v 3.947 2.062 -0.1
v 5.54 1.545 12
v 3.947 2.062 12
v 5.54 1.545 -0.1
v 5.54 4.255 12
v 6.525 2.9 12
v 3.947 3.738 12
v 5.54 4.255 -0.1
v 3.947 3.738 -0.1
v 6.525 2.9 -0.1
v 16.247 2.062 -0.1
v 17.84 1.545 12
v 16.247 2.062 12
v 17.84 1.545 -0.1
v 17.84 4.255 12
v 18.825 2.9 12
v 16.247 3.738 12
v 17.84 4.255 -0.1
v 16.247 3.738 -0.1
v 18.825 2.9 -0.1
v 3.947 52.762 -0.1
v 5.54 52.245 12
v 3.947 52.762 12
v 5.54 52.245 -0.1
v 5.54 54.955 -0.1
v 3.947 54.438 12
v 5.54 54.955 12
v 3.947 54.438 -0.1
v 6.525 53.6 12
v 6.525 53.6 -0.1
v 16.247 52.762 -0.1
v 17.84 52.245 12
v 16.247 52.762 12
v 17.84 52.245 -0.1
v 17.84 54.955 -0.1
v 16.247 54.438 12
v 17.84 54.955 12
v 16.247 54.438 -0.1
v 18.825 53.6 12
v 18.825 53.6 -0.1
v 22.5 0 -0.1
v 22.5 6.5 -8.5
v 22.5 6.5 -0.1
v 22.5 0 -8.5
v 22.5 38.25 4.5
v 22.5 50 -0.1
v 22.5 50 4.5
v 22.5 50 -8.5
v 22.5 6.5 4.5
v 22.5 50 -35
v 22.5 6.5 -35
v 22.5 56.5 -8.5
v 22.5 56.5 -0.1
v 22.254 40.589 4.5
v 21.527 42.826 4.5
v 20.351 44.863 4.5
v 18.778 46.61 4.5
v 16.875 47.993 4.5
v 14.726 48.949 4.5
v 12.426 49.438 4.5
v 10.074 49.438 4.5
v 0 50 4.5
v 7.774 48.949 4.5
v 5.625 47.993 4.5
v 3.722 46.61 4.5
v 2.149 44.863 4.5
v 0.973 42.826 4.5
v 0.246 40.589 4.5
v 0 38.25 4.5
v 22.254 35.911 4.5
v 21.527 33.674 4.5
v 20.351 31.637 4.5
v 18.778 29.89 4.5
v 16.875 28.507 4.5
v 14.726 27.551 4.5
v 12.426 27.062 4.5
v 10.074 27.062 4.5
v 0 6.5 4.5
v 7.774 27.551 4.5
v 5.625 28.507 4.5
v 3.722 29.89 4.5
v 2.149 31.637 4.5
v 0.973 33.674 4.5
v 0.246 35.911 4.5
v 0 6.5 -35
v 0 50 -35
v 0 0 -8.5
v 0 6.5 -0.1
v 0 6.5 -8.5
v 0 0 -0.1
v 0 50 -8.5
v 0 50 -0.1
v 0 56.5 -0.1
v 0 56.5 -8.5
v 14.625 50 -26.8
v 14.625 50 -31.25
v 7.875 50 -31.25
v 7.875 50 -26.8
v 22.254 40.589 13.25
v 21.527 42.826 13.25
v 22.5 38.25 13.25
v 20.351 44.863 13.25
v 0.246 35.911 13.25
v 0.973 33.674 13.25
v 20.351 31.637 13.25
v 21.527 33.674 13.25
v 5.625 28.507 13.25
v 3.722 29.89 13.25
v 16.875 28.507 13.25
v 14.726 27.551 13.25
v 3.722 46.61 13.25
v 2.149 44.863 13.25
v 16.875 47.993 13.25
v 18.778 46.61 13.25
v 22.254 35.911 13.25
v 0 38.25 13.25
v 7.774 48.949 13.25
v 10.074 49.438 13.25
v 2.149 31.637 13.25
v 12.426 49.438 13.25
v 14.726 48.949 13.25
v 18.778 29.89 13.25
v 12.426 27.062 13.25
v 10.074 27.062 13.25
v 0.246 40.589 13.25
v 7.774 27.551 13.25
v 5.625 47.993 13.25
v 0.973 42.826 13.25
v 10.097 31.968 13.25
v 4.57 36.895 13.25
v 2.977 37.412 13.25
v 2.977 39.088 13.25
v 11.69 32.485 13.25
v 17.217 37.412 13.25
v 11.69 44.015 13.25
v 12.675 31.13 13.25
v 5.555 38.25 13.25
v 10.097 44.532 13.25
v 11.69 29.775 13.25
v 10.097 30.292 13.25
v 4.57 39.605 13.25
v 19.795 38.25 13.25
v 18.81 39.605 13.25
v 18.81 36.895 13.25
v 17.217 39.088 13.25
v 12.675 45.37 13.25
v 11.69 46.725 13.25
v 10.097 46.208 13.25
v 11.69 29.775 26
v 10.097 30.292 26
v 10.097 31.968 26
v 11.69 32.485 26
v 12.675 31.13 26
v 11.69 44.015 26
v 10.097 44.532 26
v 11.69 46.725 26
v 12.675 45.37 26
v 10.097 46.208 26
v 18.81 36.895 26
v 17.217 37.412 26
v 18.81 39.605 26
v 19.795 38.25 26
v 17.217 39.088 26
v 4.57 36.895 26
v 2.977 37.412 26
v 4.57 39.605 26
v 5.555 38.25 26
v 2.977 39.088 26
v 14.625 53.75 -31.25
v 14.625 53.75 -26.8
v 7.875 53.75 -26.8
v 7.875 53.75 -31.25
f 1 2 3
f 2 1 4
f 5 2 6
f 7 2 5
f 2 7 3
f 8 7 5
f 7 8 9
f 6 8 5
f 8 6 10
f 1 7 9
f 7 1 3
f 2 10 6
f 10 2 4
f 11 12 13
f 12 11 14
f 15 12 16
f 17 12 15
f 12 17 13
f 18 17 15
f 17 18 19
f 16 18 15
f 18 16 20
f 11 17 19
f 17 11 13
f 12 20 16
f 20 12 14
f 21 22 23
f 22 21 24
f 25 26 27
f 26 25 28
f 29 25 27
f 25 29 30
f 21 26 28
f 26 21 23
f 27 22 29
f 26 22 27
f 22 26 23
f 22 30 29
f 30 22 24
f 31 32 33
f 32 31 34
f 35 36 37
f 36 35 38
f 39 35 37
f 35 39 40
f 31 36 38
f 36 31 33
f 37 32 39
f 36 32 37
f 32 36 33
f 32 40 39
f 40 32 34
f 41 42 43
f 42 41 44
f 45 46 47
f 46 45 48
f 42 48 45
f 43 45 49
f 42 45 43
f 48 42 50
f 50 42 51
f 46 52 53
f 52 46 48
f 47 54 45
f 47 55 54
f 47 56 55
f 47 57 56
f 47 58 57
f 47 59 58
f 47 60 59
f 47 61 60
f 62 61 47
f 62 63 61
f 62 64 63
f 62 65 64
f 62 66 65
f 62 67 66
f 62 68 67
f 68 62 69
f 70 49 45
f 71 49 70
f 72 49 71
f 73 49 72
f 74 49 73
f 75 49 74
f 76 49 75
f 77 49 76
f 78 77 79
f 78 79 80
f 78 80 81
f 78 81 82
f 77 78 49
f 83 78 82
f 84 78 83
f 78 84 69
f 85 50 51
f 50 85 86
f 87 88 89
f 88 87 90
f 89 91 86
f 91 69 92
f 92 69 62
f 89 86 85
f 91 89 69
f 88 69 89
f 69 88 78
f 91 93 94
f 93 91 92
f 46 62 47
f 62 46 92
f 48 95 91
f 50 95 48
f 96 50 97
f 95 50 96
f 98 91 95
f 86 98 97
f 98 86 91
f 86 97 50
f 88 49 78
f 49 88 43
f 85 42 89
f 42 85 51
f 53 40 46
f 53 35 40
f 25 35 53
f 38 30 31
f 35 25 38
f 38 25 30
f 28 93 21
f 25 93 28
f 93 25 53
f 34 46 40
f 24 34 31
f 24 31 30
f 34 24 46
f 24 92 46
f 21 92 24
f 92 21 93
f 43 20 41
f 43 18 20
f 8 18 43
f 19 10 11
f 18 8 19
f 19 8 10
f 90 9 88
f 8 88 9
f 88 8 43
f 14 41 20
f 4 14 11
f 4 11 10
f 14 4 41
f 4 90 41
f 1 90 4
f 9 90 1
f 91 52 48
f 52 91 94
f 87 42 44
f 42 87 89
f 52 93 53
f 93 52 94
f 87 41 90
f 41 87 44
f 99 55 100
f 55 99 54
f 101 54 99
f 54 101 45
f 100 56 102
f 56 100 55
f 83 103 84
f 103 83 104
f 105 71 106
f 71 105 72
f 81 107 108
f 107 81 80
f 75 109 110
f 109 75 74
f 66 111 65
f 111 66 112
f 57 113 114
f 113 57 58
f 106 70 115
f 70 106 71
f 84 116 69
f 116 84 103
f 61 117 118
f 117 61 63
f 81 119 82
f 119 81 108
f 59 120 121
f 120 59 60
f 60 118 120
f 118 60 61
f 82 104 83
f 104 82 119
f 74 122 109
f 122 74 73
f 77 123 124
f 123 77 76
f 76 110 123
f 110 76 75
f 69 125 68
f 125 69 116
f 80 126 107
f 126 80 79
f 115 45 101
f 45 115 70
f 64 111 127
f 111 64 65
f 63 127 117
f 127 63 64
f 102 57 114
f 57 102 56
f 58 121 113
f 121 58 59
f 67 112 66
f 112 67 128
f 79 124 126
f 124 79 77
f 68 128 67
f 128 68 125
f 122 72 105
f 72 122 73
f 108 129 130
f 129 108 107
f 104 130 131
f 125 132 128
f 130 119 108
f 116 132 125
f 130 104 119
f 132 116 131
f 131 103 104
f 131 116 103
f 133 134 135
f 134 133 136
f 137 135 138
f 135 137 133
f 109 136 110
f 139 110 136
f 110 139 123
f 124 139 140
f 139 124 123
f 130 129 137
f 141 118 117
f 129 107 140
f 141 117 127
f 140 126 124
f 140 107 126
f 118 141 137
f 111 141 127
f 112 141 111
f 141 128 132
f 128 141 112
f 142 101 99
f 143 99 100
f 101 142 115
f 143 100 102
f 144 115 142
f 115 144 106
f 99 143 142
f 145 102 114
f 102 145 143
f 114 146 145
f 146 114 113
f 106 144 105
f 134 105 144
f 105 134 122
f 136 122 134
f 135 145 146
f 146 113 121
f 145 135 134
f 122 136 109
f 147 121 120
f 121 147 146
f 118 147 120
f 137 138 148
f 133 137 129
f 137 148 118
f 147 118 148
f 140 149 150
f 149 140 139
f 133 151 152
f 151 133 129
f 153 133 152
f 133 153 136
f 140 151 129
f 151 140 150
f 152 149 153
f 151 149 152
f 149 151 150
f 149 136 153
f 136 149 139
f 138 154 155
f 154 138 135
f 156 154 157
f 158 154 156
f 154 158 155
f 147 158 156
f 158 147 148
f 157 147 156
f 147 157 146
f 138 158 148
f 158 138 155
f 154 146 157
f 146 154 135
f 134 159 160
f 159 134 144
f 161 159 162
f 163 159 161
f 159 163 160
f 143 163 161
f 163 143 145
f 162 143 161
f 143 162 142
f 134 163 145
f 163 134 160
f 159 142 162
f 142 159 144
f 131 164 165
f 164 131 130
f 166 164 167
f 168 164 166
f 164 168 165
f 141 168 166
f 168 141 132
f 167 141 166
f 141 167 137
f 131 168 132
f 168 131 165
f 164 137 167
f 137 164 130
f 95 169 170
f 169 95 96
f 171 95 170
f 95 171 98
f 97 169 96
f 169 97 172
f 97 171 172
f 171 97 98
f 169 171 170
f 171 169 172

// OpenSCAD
//When calling this module, use toleranceMotor(boolean,boolean); The first boolean determines the bolt direction(true is up, false is down) and the second determines where the module is centered (true centers at the hub, false centers at the motor mount)

//THIS IS FOR IF YOU USE OTHER KINDS OF MOTORS, MOTOROUTCROP IS THE DISTANCE FROM THE MOUNTING PLATE TO THE BUISNESS END OF YOUR MOTOR, IF YOU EVER NEED TO SWITCH TO ANOTHER JUST CHANGE THIS VALUE TO THE ACTUAL VALUE

function MotorOutcrop()= MotorCylinderHeight()+(MotorHeight()-(MotorWingsHeight()+MotorWingsDist()))-MotorTolerance();


//for use when the motor is incorporated into parts
	//this is distance, the short way, from the edge of the motor to the center of the hub
function MotorCenterDist()=(MotorCylinderDiam()/2) + ((MotorLength()-MotorBaseLength())/2-MotorTolerance()*2); 

//basic motor shape
function MotorHeight()=38;
function MotorBaseLength()=42;
function MotorThickness()=21;

//wings for mounting
function MotorWingsHeight()=5.5;
function MotorLength()=55;
function MotorWingsDist()=26.5;
function MotorBoltHeadHeight()=1.4;

//cylinder on top of motor
function MotorCylinderHeight()=(46-38);
function MotorCylinderDiam()=21;
function MotorCylinderDist()=31;

//all bolts
function MotorBoltHeight()=13.5;
function MotorBoltDiam()=2.1;

//body bolts
function MotorBoltDist()=4.35;

//cylinder bolts
function MotorCylBoltDist()=7.12;

//hub for wires
function MotorHubHeight()=3.7;
function MotorHubWidth()=6;
function MotorHubLength()=3;
function MotorHubDist()=3;

//THIS IS THE TOLERANCE, THIS IS PROBABLY THE ONLY THING YOU WILL NEED TO ADJUST, IF THE HOLES ARE TOO SMALL, RAISE MOTORTOLERANCE(), IF THEY ARE TOO BIG, LOWER MOTORTOLERANCE(). IF THE HOLES DON'T LINE UP, THEN START CHANGING OTHER DIMENSIONS.
function MotorTolerance()=.75;



//defining a bolt
module MotorBolt()
{
	cylinder(MotorBoltHeight()+MotorTolerance(), (MotorBoltDiam()+MotorTolerance())/2, (MotorBoltDiam()+MotorTolerance())/2, 0);
}

module MotorBodyBolts(boltPlacementZ){
		translate([MotorBoltDist(),-MotorBoltDist(),boltPlacementZ])
		{
			MotorBolt();
		}
		
		translate([(MotorThickness()-MotorBoltDist()),-MotorBoltDist(),boltPlacementZ])
		{
			MotorBolt();
		}

		translate([MotorBoltDist(),(MotorBaseLength()+MotorBoltDist()),boltPlacementZ])
		{
			MotorBolt();
		}
		
		translate([(MotorThickness()-MotorBoltDist()),(MotorBaseLength()+MotorBoltDist()),boltPlacementZ])
		{
			MotorBolt();
		}
}

module MotorBlock(boltsUp=true){
	union()
	{
//basic motor shape
		translate([-MotorTolerance(), -MotorTolerance(), -MotorTolerance()])
		{
			cube([MotorThickness()+MotorTolerance()*2, MotorBaseLength()+MotorTolerance()*2, MotorHeight()+MotorTolerance()*2]);
		}

//wings for mounting
		translate([-MotorTolerance(), (-MotorTolerance()+((MotorBaseLength()-MotorLength())/2)), MotorWingsDist()-MotorTolerance()])
		{
			cube([MotorThickness()+MotorTolerance()*2, MotorLength()+MotorTolerance()*2, MotorWingsHeight()+MotorTolerance()*2+MotorBoltHeadHeight()]);
		}

//cylinder on top of motor
		translate([MotorCylinderDiam()/2,MotorCylinderDist(),MotorHeight()])
		{
			cylinder(MotorCylinderHeight()+MotorTolerance()*2, MotorCylinderDiam()/2+MotorTolerance(), MotorCylinderDiam()/2+MotorTolerance(), 0);

		}

//body bolts

		if(boltsUp==true){
			MotorBodyBolts(MotorWingsDist()+MotorWingsHeight());
		}else{
			MotorBodyBolts(MotorWingsDist()-MotorBoltHeight());
		}
		
//cylinder bolts
		translate([MotorThickness()/2,MotorCylinderDist()-MotorCylBoltDist(),(MotorHeight()+MotorCylinderHeight())])
		{
			MotorBolt();
		}

		translate([MotorThickness()/2,MotorCylinderDist()+MotorCylBoltDist(),(MotorHeight()+MotorCylinderHeight())])
		{
			MotorBolt();
		}

		translate([MotorThickness()/2+MotorCylBoltDist(),MotorCylinderDist(),(MotorHeight()+MotorCylinderHeight())])
		{
			MotorBolt();
		}

		translate([MotorThickness()/2-MotorCylBoltDist(),MotorCylinderDist(),(MotorHeight()+MotorCylinderHeight())])
		{
			MotorBolt();
		}

//hub for wires
		translate([(MotorThickness()-(MotorHubWidth()+MotorTolerance()))/2,(MotorBaseLength()+MotorTolerance()),MotorHubDist()])
		{
			cube([MotorHubWidth()+MotorTolerance(),MotorHubLength()+MotorTolerance(),MotorHubHeight()+MotorTolerance()]);
		}
	}
}



//making the motor
module ServoMotor(boltsUp=true,hornCentered=false)
{
	if(hornCentered==true){
		translate([-MotorThickness()/2,-MotorCylinderDist(),-(MotorHeight()+MotorCylinderHeight())-MotorTolerance()*2])
		{
			MotorBlock(boltsUp);
		}
	}else{
		if(boltsUp == true){
			translate([MotorTolerance(),(MotorLength()-MotorBaseLength())/2+MotorTolerance(),(-MotorHeight()+(MotorHeight()-MotorWingsDist()-MotorWingsHeight()-MotorTolerance()*3))])
			{	
				MotorBlock(boltsUp);
			}
		}else{
			translate([MotorTolerance(),(MotorLength()-MotorBaseLength())/2+MotorTolerance(),(-MotorHeight()+(MotorHeight()-MotorWingsDist())+MotorTolerance())])
			{	
				MotorBlock(boltsUp);
			}
		}
	}

}


ServoMotor(true,false);
